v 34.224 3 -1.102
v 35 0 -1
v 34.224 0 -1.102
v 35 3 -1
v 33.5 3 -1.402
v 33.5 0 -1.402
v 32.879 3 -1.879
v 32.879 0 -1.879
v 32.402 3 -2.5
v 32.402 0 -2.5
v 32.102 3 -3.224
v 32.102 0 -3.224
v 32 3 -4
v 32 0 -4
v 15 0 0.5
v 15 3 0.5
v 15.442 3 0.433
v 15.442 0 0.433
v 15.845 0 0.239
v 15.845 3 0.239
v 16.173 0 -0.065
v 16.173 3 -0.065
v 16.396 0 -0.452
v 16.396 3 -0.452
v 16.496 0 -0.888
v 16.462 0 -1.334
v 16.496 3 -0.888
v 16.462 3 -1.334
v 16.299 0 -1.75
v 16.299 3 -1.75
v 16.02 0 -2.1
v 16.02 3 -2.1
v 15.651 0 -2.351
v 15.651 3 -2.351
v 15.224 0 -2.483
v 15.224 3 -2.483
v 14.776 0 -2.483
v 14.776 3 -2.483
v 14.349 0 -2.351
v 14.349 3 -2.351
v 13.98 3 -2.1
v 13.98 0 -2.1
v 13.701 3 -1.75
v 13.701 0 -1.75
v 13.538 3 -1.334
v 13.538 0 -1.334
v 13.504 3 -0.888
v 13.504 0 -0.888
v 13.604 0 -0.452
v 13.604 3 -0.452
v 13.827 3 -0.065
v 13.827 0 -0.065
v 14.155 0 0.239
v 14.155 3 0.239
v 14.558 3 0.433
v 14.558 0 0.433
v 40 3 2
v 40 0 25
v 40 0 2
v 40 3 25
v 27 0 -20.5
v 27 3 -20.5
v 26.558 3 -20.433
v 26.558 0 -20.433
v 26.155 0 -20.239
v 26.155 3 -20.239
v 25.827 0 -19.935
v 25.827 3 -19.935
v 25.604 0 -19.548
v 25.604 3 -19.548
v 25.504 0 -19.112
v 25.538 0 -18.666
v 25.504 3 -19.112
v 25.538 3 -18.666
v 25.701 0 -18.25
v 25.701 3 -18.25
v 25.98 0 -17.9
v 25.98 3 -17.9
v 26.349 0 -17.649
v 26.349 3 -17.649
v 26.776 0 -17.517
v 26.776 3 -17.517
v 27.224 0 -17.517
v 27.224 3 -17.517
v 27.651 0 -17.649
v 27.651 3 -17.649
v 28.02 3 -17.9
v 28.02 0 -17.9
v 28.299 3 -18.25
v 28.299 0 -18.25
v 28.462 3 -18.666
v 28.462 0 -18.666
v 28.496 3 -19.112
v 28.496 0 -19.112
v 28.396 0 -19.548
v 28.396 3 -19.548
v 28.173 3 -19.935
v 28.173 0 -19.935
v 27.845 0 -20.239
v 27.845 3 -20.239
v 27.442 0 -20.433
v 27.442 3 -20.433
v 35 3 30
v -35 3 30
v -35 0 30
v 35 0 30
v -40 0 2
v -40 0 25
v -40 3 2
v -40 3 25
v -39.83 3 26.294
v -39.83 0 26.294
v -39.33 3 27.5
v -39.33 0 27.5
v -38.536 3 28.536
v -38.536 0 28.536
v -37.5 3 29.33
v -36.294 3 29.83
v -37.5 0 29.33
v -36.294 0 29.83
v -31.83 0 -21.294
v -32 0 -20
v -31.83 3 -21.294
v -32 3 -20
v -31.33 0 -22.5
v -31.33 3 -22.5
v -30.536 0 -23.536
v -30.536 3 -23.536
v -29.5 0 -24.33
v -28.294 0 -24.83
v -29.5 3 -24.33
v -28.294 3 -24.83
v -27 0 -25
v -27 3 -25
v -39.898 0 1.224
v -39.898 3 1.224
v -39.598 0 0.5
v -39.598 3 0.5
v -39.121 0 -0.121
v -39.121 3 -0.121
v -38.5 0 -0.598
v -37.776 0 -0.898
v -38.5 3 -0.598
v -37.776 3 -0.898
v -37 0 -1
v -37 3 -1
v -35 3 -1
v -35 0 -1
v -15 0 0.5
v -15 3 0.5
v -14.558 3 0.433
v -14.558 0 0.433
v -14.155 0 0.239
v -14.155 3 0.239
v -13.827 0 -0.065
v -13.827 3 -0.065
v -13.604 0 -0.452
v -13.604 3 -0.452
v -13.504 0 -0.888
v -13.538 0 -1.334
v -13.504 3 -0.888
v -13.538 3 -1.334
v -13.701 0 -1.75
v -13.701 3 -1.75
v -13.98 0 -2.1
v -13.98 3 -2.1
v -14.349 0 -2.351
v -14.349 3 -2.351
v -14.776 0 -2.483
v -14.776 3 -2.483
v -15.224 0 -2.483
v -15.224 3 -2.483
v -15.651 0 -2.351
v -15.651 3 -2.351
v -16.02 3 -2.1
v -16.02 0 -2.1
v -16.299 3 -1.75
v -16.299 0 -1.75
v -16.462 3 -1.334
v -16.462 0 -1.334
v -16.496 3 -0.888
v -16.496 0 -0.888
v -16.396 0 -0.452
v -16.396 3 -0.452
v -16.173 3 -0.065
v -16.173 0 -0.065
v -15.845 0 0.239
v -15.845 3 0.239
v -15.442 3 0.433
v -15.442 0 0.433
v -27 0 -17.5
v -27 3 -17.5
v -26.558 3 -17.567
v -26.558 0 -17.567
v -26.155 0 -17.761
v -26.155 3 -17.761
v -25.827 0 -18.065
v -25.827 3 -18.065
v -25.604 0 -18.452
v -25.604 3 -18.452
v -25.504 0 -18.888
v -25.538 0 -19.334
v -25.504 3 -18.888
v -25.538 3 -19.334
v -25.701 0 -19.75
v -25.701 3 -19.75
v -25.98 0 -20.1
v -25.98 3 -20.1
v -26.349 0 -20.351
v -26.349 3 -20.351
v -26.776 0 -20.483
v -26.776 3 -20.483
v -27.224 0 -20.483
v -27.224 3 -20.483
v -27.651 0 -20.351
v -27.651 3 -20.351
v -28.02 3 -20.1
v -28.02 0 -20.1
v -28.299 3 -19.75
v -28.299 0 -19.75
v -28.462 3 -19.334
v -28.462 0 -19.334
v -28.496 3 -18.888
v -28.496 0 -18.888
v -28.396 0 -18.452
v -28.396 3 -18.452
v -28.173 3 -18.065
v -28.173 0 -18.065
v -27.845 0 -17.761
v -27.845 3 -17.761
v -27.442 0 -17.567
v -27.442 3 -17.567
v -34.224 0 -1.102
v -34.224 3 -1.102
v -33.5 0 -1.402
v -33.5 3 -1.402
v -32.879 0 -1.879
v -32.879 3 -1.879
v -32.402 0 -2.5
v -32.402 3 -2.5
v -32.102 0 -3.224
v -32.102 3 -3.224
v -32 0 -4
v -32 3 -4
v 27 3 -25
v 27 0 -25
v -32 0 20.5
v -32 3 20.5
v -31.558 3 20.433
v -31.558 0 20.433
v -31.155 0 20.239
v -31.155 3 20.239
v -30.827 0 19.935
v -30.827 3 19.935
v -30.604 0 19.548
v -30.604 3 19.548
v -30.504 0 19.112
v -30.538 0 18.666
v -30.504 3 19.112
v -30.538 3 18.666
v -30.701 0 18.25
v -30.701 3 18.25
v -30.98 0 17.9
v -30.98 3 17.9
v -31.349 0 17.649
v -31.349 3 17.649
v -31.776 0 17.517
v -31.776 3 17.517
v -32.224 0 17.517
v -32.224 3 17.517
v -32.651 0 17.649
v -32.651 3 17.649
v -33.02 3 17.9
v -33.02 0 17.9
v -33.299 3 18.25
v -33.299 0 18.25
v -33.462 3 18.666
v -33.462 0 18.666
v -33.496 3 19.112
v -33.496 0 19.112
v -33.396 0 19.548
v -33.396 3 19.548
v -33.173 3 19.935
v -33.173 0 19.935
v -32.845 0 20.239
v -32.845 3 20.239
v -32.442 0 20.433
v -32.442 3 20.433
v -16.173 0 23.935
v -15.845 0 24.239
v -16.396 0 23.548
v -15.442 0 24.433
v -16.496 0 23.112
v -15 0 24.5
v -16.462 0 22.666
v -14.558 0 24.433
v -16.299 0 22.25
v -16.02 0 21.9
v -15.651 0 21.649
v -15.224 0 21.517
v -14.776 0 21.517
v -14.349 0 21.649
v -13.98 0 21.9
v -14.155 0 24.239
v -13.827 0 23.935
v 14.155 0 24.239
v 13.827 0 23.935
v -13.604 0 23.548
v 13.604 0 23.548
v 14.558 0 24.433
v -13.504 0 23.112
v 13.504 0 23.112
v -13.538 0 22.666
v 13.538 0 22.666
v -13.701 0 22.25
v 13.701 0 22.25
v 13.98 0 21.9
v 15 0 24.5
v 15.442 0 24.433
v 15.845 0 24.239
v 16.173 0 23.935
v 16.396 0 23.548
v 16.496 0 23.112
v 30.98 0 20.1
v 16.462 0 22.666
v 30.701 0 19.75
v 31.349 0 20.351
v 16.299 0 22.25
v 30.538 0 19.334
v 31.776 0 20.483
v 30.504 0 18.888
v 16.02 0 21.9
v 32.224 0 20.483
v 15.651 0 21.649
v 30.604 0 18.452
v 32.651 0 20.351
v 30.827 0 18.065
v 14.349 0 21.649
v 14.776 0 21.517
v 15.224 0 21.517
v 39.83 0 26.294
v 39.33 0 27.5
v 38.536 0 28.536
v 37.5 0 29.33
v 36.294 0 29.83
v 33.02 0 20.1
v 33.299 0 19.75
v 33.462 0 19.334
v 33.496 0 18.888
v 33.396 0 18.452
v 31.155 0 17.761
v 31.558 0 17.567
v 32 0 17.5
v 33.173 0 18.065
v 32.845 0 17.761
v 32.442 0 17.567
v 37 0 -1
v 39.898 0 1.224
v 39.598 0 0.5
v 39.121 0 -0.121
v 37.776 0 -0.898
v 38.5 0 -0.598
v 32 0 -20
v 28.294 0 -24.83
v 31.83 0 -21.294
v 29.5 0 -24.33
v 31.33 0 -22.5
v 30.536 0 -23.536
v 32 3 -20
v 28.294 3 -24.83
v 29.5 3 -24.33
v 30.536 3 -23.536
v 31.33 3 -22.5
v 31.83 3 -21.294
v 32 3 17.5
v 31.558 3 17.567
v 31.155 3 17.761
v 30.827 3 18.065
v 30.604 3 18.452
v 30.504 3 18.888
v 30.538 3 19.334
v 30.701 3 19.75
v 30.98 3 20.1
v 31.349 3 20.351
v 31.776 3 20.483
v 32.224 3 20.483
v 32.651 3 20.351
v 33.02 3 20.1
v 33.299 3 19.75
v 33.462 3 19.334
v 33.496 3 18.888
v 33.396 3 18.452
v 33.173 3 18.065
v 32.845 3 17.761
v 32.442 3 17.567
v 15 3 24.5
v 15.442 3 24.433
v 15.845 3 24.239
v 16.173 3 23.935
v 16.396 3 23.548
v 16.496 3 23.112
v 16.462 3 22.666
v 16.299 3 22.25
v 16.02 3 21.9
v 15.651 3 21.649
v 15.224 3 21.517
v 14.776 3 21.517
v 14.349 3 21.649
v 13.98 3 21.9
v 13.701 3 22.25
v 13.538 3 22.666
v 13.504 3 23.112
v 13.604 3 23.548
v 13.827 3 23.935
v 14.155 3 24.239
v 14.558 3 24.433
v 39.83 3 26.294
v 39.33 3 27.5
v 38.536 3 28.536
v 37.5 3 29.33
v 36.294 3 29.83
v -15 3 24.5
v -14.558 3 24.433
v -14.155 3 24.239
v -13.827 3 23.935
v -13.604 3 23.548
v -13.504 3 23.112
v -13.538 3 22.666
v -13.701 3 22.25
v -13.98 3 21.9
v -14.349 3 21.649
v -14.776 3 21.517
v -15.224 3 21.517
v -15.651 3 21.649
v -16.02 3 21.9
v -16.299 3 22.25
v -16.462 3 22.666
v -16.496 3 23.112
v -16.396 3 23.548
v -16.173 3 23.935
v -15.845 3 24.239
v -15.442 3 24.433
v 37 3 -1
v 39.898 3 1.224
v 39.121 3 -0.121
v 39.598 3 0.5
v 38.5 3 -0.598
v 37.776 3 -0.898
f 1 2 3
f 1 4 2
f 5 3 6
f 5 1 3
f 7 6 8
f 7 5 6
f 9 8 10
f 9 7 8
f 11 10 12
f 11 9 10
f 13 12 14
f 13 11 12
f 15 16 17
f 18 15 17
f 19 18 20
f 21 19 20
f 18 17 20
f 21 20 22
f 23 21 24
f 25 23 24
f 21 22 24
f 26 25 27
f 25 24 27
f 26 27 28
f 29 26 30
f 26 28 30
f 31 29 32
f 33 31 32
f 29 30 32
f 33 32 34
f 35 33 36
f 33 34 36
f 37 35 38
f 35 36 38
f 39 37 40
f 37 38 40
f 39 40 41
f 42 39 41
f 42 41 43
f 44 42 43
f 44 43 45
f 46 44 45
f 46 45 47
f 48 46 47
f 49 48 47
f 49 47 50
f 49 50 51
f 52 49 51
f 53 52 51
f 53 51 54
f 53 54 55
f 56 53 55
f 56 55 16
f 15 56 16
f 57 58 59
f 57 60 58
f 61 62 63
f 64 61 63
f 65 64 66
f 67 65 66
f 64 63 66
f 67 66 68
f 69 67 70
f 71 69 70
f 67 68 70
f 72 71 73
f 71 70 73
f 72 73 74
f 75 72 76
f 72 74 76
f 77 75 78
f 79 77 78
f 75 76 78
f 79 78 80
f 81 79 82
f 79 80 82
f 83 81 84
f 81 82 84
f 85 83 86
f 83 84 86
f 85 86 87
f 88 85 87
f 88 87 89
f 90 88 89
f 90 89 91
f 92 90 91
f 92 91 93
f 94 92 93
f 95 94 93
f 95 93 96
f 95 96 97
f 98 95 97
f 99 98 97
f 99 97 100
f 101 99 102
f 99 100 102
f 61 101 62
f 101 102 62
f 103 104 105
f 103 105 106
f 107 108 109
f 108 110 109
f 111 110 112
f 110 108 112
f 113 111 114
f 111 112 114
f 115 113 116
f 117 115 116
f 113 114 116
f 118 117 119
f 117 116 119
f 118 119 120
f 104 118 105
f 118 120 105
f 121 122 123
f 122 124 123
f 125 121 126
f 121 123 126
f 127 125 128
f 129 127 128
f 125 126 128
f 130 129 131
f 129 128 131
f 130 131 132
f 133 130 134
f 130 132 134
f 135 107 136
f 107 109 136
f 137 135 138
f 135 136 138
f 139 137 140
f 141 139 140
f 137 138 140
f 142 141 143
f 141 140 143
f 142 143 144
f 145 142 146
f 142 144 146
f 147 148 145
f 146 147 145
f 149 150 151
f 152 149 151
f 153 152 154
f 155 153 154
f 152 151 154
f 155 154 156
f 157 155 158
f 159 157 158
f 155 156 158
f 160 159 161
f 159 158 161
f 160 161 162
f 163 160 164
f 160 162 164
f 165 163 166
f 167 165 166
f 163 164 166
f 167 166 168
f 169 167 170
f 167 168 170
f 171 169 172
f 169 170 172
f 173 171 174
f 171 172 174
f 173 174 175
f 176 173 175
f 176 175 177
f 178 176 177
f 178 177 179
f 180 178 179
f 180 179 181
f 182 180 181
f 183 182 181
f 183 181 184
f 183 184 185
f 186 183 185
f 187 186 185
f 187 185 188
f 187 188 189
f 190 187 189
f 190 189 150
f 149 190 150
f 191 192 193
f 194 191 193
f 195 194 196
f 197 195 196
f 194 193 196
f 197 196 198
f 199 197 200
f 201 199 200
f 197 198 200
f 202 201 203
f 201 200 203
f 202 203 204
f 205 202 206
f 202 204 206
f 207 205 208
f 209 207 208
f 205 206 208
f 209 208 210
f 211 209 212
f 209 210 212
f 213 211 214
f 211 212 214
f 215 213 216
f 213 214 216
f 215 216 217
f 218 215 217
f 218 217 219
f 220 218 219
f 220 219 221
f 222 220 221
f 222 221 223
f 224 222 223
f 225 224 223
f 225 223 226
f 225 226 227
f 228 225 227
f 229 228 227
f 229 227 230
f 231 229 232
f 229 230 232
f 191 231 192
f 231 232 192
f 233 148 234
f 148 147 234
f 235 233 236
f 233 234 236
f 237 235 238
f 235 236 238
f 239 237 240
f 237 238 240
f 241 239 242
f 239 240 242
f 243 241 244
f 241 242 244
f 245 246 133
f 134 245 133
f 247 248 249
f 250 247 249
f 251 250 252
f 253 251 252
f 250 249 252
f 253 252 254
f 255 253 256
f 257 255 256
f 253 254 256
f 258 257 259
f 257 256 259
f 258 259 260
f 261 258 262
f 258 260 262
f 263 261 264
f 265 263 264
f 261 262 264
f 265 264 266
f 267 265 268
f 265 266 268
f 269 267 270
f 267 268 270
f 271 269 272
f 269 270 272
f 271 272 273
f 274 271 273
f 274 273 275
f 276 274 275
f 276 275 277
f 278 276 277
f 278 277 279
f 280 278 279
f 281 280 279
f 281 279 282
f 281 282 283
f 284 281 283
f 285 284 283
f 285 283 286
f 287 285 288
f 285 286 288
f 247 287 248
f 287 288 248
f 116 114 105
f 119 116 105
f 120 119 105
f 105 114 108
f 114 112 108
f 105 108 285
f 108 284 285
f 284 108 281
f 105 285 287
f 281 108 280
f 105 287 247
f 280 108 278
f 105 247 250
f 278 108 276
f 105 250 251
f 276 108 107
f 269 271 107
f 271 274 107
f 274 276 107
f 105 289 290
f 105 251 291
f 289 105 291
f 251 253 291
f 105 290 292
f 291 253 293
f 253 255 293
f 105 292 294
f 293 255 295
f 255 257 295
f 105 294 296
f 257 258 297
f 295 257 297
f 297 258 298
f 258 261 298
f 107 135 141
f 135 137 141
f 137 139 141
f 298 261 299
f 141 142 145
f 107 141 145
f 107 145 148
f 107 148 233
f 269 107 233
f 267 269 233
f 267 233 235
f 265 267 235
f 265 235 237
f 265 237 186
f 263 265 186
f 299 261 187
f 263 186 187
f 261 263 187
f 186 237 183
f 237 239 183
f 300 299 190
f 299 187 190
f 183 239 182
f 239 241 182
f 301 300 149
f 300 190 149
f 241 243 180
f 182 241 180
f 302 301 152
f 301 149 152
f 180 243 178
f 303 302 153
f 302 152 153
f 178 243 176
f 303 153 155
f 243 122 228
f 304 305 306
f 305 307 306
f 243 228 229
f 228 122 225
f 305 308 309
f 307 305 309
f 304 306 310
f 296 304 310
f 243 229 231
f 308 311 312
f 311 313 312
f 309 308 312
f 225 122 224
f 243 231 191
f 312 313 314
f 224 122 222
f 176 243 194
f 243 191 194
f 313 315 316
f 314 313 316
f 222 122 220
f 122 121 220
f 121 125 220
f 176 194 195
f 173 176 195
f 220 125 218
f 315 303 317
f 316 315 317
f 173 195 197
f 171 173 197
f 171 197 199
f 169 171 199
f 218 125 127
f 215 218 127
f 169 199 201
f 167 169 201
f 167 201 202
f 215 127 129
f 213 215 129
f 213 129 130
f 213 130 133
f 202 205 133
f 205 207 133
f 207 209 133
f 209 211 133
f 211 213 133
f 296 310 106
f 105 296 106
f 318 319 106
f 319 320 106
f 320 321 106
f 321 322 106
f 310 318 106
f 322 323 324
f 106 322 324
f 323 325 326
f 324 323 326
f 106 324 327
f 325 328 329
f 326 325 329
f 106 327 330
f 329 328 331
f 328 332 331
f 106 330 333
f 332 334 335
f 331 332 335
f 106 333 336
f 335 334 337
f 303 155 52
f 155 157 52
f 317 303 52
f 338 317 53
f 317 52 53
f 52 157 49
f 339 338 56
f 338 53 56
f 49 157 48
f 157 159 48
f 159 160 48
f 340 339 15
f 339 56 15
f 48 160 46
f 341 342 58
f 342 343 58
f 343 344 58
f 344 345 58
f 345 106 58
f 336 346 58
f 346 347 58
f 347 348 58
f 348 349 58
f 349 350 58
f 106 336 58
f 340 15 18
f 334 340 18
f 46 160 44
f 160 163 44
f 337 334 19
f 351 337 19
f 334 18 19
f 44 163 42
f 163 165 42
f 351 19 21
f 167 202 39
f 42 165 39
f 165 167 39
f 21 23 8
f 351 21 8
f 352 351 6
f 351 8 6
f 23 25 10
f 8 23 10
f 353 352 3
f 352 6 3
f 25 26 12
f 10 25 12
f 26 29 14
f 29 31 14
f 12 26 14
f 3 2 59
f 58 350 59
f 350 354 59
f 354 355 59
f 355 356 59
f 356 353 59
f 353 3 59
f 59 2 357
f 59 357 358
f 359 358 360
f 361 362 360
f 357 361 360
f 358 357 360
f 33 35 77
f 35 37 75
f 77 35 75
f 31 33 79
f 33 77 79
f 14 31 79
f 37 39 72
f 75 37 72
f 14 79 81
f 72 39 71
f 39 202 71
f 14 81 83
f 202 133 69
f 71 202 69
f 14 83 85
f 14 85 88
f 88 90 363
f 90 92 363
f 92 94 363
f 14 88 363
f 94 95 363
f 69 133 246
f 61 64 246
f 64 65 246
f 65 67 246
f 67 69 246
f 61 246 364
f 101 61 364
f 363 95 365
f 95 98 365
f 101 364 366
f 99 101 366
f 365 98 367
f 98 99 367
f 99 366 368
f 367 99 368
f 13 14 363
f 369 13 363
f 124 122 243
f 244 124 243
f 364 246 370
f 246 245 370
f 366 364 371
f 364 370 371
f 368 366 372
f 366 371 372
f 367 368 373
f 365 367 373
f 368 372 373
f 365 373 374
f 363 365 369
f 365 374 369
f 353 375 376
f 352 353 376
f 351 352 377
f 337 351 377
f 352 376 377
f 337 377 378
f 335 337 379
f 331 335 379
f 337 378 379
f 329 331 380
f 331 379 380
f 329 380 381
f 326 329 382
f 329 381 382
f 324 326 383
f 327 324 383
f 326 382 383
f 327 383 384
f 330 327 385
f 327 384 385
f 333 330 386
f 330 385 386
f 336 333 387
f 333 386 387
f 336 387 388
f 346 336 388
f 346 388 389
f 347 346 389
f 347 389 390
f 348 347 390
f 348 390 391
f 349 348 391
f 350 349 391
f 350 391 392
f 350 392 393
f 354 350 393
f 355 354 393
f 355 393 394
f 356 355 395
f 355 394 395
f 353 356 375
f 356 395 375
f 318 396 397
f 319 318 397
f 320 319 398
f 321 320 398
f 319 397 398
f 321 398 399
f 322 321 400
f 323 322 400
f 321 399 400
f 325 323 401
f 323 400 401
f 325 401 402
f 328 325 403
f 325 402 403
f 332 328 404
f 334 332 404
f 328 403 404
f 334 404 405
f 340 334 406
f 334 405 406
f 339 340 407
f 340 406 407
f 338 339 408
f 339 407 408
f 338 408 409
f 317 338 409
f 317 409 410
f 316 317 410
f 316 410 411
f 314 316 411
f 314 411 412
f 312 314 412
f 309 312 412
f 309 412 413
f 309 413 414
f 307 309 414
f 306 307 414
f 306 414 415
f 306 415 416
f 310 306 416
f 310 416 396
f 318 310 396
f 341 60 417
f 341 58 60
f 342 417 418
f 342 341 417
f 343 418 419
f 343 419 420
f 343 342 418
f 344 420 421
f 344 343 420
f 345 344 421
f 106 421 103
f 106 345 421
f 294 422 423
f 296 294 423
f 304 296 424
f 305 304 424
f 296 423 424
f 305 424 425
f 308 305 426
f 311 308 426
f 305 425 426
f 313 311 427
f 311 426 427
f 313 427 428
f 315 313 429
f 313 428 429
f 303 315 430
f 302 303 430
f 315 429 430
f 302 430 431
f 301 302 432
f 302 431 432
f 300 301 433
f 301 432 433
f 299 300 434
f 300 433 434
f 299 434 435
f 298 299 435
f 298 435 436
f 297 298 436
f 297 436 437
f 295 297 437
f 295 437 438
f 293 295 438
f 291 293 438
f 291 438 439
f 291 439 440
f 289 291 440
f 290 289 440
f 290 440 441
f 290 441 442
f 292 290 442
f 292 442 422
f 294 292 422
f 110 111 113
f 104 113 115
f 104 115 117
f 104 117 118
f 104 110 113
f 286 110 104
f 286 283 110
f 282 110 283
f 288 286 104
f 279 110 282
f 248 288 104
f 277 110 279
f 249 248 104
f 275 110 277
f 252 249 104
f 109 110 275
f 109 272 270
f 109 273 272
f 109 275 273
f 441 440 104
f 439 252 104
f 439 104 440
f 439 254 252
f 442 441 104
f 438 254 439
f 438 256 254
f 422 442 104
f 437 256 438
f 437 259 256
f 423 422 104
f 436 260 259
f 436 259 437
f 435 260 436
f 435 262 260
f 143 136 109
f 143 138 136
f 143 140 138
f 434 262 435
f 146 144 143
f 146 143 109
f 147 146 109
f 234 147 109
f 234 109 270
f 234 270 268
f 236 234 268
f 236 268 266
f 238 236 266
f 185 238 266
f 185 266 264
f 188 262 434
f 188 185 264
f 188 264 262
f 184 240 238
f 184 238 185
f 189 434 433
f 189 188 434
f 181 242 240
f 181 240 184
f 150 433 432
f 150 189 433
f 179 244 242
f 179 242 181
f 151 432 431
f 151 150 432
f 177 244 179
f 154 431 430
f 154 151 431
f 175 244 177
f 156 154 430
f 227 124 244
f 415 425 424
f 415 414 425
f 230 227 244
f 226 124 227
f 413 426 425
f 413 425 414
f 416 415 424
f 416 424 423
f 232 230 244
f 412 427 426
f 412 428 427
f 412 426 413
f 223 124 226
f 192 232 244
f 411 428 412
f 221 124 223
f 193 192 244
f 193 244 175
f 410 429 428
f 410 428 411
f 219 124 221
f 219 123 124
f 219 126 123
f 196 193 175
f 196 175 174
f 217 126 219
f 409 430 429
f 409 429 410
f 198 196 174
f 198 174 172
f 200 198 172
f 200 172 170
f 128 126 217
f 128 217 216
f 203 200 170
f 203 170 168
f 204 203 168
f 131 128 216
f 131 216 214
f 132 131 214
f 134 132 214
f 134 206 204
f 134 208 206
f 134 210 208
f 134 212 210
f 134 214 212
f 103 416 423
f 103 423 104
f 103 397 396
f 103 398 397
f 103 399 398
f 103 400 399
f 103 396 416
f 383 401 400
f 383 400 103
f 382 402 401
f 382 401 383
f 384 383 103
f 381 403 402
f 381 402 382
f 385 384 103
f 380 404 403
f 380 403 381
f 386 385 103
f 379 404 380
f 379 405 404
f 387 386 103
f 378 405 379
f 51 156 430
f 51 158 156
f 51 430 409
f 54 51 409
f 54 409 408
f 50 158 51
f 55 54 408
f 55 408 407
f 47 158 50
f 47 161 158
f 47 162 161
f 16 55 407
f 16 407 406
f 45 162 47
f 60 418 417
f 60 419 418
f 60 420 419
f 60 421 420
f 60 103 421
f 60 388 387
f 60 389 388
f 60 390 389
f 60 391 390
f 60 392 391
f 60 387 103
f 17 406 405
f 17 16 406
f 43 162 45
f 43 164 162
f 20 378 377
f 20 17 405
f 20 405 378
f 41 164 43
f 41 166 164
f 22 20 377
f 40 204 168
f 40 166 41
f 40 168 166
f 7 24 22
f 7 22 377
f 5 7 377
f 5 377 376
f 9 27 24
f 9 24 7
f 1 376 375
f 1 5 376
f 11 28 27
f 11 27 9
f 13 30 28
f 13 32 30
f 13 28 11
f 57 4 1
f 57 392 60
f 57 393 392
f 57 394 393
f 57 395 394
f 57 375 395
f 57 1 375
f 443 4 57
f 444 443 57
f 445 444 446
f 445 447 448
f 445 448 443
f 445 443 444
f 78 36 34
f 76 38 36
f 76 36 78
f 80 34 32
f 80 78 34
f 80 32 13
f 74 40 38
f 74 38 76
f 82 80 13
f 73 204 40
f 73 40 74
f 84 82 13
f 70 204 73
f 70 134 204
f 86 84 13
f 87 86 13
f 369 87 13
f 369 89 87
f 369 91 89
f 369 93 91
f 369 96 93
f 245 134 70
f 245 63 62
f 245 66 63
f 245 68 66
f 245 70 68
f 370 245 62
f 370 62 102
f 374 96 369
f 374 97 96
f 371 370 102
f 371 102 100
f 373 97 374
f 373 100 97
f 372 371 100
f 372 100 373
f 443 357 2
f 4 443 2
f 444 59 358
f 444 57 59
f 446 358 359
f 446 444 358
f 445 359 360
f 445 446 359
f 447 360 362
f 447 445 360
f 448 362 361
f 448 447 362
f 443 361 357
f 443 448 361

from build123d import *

# Parameters (mm, degrees)
EXTRUDE_1_DEPTH     = 3
SKETCH_2_R          = 1.5
CUT_EXTRUDE_1_DEPTH = 3
FILLET_1_R          = 3
SKETCH_3_R          = 1.5
CUT_EXTRUDE_2_DEPTH = 10
SKETCH_4_W          = 80
SKETCH_4_H          = 5
EXTRUDE_2_DEPTH     = 3
FILLET_2_R          = 5


with BuildPart() as part:
    # 草图1 → 凸台-拉伸1 (new body)
    with BuildSketch(Plane(origin=(0, 0, 0), x_dir=(1, 0, 0), z_dir=(0, 1, 0))):
        Polygon((-40, 1), (-40, -25), (40, -25), (40, 1), (32, 1), (32, 25), (-32, 25), (-32, 1), align=None)
    extrude(amount=EXTRUDE_1_DEPTH)

    # 草图2 → 切除-拉伸1 (cut)
    with BuildSketch(Plane(origin=(0, 3, 0), x_dir=(1, 0, 0), z_dir=(0, 1, 0))):
        with Locations(Location((-32, -19, 0), (0, 0, 270))):
            Circle(SKETCH_2_R)
        with Locations(Location((32, -19, 0), (0, 0, 90))):
            Circle(SKETCH_2_R)
        with Locations(Location((-27, 19, 0), (0, 0, 270))):
            Circle(SKETCH_2_R)
        with Locations(Location((27, 19, 0), (0, 0, 90))):
            Circle(SKETCH_2_R)
    extrude(amount=-CUT_EXTRUDE_1_DEPTH, mode=Mode.SUBTRACT)

    # 圆角1
    fillet_1_edges = [part.edges().sort_by_distance(p)[0] for p in [
        (32, 1.5, -1),
        (40, 1.5, -1),
        (-40, 1.5, -1),
        (-32, 1.5, -1),
    ]]
    fillet(fillet_1_edges, radius=FILLET_1_R)

    # 草图3 → 切除-拉伸2 (cut)
    with BuildSketch(Plane(origin=(0, 3, 0), x_dir=(1, 0, 0), z_dir=(0, 1, 0))):
        with Locations(Location((-15, 1, 0), (0, 0, 270))):
            Circle(SKETCH_3_R)
        with Locations(Location((-15, -23, 0), (0, 0, 270))):
            Circle(SKETCH_3_R)
        with Locations(Location((15, -23, 0), (0, 0, 270))):
            Circle(SKETCH_3_R)
        with Locations(Location((15, 1, 0), (0, 0, 270))):
            Circle(SKETCH_3_R)
    extrude(amount=-CUT_EXTRUDE_2_DEPTH, mode=Mode.SUBTRACT)

    # 草图4 → 凸台-拉伸2 (add)
    with BuildSketch(Plane(origin=(0, 3, 0), x_dir=(1, 0, 0), z_dir=(0, 1, 0))):
        with Locations((0, -27.5)):
            Rectangle(SKETCH_4_W, SKETCH_4_H)
    extrude(amount=-EXTRUDE_2_DEPTH)

    # 圆角2
    fillet_2_edges = [part.edges().sort_by_distance(p)[0] for p in [
        (-32, 1.5, -25),
        (32, 1.5, -25),
        (40, 1.5, 30),
        (-40, 1.5, 30),
    ]]
    fillet(fillet_2_edges, radius=FILLET_2_R)


solid = part.part
